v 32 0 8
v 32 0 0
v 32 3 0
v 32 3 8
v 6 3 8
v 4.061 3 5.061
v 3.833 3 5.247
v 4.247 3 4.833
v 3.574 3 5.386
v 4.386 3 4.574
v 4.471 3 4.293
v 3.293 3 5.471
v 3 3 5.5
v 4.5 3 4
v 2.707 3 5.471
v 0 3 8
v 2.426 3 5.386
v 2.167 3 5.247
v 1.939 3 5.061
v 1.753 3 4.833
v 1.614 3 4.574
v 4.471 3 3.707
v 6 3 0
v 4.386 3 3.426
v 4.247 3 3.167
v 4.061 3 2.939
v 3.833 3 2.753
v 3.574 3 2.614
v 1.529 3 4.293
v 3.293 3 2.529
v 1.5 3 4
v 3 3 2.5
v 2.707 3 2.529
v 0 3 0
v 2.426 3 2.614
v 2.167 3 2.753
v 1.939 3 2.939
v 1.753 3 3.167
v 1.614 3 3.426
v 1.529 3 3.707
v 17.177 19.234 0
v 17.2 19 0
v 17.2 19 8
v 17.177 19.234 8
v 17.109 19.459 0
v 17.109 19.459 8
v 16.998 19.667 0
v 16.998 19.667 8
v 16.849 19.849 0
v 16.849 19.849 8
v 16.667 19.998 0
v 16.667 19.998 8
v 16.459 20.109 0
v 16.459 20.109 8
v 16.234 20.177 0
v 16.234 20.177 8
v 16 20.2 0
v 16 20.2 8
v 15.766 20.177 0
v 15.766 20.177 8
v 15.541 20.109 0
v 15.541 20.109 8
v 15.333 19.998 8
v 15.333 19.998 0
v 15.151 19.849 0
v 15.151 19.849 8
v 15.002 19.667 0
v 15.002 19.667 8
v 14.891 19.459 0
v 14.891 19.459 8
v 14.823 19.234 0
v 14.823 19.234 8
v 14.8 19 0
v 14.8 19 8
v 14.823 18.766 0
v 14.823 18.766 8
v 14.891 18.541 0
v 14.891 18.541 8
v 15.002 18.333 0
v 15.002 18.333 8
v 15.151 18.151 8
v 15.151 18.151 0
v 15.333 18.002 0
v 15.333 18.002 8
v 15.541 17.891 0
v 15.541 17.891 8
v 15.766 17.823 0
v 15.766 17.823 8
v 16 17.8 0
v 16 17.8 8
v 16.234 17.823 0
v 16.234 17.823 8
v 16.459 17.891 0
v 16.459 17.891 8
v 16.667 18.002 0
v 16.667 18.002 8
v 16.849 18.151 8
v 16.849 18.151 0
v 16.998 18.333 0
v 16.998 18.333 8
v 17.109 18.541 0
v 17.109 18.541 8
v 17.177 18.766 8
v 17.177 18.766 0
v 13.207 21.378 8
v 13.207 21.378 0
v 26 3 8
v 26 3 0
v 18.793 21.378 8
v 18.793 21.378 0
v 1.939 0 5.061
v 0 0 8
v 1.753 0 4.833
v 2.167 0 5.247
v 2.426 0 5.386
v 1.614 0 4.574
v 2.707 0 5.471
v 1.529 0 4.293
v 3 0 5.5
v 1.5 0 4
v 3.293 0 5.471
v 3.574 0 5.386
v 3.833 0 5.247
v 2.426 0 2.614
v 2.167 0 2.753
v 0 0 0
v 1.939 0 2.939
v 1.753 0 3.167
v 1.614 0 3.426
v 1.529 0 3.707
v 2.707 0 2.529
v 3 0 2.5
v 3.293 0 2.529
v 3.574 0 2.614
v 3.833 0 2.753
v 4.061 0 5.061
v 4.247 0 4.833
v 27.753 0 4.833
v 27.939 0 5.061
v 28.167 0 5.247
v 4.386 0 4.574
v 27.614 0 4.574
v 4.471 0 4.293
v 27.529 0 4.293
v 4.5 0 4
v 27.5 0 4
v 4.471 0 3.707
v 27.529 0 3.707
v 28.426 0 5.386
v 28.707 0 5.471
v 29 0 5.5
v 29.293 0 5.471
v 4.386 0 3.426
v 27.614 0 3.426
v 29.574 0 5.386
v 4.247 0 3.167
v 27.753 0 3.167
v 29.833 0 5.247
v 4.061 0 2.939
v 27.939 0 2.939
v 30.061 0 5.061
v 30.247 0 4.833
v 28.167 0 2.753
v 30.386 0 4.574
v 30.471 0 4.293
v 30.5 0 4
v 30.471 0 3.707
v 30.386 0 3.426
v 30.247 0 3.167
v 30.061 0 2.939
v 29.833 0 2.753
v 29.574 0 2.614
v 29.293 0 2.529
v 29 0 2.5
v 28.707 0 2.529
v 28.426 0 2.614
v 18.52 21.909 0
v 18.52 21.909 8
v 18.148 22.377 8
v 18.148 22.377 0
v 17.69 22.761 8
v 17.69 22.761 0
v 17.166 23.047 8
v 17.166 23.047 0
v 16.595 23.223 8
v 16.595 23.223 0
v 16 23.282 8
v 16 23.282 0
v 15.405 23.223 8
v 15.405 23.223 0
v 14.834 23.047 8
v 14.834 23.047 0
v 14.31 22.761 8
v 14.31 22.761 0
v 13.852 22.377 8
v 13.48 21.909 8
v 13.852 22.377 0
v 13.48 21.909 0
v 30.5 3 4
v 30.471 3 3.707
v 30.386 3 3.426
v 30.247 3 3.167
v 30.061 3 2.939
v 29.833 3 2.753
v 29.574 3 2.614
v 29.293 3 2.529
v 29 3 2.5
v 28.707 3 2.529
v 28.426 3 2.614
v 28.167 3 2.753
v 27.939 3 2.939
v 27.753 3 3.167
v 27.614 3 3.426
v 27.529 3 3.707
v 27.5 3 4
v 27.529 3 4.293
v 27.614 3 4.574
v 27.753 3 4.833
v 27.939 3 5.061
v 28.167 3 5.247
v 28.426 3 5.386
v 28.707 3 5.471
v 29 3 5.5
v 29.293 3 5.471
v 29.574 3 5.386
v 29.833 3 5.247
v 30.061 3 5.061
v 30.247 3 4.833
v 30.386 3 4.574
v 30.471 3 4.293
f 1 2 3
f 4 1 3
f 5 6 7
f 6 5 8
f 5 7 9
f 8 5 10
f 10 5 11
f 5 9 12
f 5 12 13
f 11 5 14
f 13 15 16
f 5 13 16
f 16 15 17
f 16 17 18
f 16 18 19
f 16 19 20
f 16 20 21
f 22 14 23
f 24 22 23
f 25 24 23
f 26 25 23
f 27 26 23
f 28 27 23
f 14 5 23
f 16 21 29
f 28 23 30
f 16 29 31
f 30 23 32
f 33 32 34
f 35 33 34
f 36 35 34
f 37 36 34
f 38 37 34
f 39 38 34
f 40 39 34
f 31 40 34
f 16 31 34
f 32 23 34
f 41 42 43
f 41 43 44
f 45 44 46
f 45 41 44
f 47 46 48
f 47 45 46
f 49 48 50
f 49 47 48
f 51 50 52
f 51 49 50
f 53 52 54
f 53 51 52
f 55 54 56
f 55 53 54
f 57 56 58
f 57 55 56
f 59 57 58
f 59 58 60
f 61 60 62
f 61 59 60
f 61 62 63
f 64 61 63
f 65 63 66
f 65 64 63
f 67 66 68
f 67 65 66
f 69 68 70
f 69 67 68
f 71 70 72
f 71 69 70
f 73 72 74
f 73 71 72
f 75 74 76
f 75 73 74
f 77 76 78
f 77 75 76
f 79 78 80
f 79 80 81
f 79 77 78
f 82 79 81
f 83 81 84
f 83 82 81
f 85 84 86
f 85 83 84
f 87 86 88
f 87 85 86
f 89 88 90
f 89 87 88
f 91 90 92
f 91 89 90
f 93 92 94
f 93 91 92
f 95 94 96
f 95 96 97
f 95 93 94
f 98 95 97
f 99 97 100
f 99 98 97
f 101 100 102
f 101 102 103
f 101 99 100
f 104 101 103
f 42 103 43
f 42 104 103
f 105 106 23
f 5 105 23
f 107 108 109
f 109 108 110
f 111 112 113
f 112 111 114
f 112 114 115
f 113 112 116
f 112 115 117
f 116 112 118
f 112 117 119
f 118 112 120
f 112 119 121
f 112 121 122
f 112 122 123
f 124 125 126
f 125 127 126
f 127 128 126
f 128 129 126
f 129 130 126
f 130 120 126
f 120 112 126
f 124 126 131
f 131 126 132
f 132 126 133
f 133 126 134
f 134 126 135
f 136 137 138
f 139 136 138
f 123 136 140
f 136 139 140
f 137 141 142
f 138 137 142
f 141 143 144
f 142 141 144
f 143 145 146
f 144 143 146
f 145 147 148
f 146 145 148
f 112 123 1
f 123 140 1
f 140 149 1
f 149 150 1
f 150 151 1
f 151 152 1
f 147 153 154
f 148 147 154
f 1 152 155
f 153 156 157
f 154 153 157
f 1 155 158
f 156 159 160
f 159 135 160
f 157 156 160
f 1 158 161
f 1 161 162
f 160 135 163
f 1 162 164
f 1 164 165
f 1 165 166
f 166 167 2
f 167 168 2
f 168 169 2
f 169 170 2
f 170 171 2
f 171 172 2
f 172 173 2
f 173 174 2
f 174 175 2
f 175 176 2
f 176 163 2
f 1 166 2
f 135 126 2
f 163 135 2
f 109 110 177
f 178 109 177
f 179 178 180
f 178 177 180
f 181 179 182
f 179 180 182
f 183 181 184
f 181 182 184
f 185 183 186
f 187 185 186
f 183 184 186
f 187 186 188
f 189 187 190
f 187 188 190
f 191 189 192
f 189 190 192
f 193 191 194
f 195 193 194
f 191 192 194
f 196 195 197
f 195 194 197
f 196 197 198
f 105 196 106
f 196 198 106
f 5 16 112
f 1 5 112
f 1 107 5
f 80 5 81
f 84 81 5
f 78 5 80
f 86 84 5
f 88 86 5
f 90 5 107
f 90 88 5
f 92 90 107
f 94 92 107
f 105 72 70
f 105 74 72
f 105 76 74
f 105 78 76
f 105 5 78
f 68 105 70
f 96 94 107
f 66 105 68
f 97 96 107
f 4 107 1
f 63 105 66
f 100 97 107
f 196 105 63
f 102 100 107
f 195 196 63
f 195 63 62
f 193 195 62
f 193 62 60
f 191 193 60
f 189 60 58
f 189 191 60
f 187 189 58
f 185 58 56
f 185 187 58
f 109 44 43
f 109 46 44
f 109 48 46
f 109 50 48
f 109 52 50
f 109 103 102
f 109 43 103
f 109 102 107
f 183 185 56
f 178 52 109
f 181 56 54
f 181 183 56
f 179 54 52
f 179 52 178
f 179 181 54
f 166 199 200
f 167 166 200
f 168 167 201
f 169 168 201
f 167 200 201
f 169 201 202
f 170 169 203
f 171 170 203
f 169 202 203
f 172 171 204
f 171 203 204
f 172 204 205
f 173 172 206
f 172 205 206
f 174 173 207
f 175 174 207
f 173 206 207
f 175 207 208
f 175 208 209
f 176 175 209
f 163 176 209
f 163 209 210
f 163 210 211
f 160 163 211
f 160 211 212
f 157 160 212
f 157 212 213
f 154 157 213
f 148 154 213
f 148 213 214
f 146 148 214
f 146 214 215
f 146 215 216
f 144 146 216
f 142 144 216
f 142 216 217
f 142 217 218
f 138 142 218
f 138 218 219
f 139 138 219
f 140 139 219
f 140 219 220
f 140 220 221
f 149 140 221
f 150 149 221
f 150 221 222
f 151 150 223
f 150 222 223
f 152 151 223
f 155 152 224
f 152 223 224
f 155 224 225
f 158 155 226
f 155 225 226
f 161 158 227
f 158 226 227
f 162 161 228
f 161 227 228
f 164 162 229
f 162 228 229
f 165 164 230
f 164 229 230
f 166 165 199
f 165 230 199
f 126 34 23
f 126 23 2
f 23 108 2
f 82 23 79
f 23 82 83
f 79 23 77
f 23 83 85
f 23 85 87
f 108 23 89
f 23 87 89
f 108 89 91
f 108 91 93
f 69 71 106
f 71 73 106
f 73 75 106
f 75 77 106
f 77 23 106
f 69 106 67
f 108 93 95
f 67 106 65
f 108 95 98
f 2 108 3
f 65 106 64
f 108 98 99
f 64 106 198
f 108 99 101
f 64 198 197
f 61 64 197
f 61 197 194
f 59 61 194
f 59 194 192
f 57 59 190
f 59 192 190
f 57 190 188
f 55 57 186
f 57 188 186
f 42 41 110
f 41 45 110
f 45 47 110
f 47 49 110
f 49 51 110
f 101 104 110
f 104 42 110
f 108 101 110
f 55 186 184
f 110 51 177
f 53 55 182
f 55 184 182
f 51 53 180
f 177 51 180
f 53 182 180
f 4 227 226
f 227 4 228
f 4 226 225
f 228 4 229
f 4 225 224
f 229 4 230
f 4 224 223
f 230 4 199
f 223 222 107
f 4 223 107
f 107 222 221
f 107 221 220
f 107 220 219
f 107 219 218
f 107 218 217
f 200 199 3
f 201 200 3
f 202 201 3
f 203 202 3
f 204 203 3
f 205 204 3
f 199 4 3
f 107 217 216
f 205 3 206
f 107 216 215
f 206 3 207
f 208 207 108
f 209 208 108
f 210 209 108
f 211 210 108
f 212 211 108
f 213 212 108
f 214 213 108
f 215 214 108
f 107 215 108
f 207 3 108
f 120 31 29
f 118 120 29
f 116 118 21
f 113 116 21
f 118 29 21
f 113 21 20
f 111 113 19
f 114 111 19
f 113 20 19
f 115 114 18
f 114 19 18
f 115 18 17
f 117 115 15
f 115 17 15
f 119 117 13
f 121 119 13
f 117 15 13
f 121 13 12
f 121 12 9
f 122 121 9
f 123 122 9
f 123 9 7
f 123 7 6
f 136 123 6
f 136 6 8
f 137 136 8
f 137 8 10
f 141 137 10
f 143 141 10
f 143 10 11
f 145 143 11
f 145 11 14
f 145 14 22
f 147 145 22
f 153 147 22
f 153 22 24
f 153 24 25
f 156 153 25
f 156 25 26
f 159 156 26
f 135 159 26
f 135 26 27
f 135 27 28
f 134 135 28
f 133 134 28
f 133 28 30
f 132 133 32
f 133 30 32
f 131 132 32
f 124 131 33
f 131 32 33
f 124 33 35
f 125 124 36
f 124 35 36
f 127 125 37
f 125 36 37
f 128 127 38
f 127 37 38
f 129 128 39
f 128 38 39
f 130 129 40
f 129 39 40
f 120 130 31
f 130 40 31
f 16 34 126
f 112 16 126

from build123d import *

# Parameters (mm, degrees)
ESQUISSE1_R             = 1.2
BOSS_EXTRU_1_DEPTH      = 8
ESQUISSE2_R             = 1.5
ENL_V_MAT_EXTRU_1_DEPTH = 39.721703123


with BuildPart() as part:
    # Esquisse1 → Boss.-Extru.1 (new body)
    with BuildSketch(Plane.XY):
        with BuildLine():
            Line((0, 0), (32, 0))
            Line((32, 0), (32, 3))
            Line((32, 3), (26, 3))
            Line((26, 3), (18.792908921, 21.37755528))
            ThreePointArc((18.792908921, 21.37755528), (16, 23.282265473), (13.207091079, 21.37755528))
            Line((13.207091079, 21.37755528), (6, 3))
            Line((6, 3), (0, 3))
            Line((0, 3), (0, 0))
        make_face()
        with Locations((16, 19)):
            Circle(ESQUISSE1_R, mode=Mode.SUBTRACT)
    extrude(amount=BOSS_EXTRU_1_DEPTH)

    # Esquisse2 → Enlèv. mat.-Extru.1 (cut, through all)
    with BuildSketch(Plane(origin=(0, 3, 0), x_dir=(1, 0, 0), z_dir=(0, 1, 0))):
        with Locations(Location((3, -4, 0), (0, 0, 180))):
            Circle(ESQUISSE2_R)
        with Locations((29, -4)):
            Circle(ESQUISSE2_R)
    extrude(amount=-ENL_V_MAT_EXTRU_1_DEPTH, mode=Mode.SUBTRACT)


solid = part.part
